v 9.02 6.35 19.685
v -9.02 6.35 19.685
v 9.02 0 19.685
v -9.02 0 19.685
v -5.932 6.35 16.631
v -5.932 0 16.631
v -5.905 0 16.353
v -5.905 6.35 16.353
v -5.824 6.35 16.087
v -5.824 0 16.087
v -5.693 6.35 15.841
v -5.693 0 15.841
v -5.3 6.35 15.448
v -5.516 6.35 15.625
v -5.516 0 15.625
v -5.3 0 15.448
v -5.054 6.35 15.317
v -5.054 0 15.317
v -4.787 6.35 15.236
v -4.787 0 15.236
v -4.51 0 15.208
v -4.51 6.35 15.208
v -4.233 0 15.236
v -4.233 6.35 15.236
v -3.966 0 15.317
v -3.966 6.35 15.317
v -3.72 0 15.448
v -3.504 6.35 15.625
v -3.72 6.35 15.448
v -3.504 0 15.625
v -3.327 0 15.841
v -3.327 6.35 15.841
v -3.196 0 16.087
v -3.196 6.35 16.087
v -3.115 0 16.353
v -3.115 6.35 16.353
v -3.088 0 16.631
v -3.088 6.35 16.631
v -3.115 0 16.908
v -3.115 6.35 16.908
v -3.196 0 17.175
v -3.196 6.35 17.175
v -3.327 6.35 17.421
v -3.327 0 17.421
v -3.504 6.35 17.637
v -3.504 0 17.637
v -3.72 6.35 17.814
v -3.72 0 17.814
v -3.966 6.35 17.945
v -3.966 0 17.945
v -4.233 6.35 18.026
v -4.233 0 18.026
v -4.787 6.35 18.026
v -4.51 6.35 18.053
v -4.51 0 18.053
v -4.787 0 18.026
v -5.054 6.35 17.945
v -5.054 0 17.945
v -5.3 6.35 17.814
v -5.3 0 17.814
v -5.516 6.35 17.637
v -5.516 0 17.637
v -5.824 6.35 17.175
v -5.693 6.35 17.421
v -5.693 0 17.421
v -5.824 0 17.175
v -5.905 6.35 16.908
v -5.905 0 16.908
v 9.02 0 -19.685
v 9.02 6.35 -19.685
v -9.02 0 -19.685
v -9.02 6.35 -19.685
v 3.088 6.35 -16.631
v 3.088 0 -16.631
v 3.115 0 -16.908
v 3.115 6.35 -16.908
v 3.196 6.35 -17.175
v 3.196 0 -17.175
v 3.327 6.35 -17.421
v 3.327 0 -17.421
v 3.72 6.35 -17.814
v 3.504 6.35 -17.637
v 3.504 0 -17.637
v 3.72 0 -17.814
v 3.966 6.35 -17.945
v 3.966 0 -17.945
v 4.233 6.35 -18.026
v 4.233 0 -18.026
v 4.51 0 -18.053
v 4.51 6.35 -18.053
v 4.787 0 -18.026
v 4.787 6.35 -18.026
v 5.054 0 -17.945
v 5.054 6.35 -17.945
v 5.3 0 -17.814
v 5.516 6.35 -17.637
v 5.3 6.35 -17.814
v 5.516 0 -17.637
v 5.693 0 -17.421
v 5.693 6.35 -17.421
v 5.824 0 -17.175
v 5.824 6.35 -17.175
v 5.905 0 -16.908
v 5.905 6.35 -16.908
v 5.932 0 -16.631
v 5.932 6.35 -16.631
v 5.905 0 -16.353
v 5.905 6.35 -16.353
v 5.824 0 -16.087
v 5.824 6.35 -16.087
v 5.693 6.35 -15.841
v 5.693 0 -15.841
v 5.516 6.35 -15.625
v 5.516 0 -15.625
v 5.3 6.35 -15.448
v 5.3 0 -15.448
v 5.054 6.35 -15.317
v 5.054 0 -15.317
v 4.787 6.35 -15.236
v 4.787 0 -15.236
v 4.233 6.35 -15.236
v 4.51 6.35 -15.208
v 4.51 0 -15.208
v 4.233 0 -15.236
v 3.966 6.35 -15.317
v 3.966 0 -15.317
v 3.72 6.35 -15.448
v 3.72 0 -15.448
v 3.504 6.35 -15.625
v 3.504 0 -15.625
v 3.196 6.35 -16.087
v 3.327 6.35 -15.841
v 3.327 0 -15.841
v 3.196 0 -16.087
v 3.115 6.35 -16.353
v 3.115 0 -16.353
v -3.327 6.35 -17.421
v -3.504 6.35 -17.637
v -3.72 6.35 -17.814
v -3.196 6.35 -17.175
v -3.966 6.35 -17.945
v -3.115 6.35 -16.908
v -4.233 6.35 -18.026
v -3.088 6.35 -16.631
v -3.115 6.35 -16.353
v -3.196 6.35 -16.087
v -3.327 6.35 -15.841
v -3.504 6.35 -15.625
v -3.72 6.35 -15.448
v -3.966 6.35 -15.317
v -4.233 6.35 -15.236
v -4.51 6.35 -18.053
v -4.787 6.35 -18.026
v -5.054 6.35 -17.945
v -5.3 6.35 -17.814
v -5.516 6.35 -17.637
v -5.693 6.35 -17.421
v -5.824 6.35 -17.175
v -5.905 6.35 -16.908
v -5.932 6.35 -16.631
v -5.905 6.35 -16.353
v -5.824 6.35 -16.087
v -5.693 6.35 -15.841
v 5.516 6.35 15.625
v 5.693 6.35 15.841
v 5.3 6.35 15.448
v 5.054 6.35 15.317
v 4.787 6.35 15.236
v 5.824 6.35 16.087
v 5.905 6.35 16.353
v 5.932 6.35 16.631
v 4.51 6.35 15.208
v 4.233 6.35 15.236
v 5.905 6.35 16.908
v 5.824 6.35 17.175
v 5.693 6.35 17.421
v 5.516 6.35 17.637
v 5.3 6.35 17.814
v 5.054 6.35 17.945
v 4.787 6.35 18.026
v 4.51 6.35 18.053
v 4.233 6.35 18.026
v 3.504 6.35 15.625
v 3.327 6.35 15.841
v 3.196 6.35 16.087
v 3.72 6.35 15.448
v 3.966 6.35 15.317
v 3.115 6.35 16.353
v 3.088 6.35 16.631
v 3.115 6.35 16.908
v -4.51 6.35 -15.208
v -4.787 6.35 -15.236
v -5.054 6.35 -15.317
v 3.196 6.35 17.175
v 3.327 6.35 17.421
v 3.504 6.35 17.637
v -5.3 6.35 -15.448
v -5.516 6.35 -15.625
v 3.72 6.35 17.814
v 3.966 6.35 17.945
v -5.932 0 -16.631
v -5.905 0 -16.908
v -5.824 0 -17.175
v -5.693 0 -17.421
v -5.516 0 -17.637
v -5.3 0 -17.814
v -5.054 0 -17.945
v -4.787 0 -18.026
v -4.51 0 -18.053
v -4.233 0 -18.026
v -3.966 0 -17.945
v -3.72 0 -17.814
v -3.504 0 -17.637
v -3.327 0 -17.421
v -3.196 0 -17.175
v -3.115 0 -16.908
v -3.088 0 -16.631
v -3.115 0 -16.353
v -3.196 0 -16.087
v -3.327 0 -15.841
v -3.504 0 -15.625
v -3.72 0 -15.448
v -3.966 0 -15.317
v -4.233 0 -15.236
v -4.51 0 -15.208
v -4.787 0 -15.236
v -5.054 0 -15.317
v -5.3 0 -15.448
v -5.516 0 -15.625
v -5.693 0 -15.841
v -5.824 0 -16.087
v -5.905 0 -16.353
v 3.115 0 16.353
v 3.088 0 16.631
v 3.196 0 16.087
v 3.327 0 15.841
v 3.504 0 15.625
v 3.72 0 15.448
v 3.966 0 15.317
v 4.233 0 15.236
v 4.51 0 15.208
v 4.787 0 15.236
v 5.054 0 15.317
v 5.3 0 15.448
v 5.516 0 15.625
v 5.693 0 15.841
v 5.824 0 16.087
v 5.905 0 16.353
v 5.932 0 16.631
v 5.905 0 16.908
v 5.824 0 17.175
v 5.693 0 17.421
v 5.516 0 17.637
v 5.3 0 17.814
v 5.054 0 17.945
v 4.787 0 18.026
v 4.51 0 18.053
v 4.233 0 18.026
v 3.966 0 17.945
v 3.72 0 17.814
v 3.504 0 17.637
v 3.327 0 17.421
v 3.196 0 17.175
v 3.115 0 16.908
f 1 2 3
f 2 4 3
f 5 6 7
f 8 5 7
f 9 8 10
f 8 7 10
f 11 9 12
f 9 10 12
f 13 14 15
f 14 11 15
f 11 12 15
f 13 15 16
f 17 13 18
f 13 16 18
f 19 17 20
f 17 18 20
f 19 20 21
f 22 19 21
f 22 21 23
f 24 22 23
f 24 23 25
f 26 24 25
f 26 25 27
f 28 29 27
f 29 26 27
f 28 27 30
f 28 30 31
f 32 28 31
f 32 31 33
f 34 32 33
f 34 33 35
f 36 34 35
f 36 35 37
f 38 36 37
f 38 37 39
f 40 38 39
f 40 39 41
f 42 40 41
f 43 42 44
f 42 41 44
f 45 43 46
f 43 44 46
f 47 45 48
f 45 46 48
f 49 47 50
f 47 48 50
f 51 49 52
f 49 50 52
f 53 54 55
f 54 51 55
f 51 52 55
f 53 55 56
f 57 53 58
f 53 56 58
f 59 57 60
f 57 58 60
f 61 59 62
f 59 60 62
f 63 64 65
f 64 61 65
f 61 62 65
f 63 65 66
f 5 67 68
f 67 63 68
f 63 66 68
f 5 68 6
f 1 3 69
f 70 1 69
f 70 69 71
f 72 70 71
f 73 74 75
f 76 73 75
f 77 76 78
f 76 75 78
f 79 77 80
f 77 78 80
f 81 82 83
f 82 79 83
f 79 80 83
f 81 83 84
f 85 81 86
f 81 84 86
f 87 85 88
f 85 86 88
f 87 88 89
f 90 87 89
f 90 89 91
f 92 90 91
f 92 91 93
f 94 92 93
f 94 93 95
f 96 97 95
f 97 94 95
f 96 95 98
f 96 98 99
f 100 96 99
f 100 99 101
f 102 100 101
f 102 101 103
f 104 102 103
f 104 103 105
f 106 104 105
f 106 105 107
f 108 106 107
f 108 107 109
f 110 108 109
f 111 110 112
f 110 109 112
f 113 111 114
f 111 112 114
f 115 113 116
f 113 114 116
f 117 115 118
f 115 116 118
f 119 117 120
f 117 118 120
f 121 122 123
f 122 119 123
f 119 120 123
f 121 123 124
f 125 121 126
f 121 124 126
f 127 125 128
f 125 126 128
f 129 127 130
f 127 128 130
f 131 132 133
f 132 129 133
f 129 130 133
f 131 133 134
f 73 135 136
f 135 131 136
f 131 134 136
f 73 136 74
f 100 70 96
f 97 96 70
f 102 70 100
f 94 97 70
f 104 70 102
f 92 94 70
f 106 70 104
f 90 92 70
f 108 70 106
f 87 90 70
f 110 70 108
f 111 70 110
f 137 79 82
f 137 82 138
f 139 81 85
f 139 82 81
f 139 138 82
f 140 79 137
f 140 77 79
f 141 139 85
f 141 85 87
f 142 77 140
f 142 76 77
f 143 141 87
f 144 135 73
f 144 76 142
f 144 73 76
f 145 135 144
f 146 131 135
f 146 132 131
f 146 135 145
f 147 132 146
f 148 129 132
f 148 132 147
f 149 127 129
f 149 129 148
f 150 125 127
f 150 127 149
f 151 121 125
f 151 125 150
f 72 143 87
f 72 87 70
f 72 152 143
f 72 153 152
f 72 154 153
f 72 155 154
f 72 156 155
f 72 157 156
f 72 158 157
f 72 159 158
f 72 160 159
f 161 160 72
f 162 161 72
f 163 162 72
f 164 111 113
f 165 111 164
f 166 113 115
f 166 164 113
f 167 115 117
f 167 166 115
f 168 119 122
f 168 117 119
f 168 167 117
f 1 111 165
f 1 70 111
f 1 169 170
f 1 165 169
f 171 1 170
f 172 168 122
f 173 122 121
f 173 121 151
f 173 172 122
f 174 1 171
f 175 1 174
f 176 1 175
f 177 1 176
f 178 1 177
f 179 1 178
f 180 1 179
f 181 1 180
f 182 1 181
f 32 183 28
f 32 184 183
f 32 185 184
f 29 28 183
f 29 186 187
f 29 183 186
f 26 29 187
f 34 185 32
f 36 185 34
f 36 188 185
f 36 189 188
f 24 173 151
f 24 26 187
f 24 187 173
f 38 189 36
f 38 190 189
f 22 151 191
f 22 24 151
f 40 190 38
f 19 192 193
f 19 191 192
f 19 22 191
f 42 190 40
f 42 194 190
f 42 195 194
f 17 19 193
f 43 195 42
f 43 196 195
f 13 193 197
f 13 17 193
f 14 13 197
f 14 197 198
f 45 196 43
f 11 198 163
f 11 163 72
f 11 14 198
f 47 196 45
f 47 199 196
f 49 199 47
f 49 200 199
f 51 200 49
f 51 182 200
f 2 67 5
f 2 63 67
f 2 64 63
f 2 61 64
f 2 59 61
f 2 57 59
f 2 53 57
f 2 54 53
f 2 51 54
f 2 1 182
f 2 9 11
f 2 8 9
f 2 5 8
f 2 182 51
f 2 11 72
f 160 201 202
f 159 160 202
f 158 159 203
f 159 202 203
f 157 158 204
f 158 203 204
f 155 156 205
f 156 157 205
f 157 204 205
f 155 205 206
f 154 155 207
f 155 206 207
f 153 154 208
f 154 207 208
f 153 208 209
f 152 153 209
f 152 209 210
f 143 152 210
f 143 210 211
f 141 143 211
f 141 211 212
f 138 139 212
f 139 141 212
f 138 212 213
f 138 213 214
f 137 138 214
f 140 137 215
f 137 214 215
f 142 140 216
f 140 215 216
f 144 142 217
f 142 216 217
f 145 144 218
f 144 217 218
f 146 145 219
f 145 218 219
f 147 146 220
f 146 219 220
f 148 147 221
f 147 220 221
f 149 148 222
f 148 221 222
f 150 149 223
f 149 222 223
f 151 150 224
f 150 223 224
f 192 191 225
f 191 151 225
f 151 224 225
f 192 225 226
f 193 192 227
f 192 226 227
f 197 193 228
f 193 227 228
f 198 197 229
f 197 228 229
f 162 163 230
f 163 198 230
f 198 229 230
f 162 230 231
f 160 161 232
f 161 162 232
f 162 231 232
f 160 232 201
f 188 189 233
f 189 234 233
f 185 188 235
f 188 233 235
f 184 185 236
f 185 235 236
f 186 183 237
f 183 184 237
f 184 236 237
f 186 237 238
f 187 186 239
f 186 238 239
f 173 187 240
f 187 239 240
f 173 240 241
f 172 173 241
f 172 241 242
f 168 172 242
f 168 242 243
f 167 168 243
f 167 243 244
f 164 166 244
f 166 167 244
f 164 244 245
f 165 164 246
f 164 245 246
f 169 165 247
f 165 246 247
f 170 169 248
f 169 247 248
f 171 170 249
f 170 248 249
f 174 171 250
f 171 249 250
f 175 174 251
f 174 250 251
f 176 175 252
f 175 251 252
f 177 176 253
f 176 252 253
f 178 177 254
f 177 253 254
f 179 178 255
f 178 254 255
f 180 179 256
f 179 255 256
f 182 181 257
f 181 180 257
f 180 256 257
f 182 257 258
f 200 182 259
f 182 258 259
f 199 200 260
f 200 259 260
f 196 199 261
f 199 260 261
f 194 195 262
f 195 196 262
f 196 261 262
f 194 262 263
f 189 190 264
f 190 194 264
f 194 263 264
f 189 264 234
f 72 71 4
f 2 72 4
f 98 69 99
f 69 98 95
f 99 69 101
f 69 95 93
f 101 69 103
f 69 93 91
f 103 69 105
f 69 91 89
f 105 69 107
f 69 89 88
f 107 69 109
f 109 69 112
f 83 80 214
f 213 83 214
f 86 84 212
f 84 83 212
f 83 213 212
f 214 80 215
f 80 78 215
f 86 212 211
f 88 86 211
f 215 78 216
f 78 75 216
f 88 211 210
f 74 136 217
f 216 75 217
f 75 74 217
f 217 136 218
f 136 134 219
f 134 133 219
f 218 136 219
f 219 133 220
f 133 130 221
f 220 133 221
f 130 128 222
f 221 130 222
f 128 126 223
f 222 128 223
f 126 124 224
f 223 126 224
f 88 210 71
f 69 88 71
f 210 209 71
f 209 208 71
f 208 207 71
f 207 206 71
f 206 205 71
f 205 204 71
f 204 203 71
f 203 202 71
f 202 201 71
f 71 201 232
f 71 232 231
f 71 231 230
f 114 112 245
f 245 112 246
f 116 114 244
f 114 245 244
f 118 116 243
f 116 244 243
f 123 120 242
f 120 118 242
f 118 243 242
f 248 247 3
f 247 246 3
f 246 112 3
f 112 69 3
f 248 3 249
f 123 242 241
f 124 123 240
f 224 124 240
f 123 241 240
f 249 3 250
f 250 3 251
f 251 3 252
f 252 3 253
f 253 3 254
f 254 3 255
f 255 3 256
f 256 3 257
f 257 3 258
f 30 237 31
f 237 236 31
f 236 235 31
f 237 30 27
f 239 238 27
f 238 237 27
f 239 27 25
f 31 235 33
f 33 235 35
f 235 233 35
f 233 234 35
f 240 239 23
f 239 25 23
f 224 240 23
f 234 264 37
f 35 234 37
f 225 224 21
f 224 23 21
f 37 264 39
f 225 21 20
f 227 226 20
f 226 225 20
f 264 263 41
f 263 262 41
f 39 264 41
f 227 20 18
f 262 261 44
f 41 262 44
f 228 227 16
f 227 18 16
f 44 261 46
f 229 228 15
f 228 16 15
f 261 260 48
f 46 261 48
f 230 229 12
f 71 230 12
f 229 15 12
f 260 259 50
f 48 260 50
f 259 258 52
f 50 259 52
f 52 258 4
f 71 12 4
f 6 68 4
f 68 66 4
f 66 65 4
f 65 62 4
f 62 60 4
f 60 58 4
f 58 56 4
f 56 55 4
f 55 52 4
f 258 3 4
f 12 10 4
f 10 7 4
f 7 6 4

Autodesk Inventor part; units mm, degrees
ref_plane "YZ Plane" through (0, 0, 0) normal (1, 0, 0) x (0, 1, 0)
ref_plane "XZ Plane" through (0, 0, 0) normal (0, 1, 0) x (-1, 0, 0)
ref_plane "XY Plane" through (0, 0, 0) normal (0, 0, 1) x (1, 0, 0)
sketch "Sketch1" plane through (0, 0, 0) normal (0, 1, 0) x (-1, 0, 0)
  line L0 (9.02, 19.685) -> (-9.02, 19.685)
  line L1 (-9.02, 19.685) -> (-9.02, -19.685)
  line L2 (-9.02, -19.685) -> (9.02, -19.685)
  line L3 (9.02, -19.685) -> (9.02, 19.685)
  circle A0 centre (4.51, 16.6309) radius 1.4224
  circle A1 centre (-4.51, 16.6309) radius 1.4224
  circle A2 centre (4.51, -16.6309) radius 1.4224
  circle A3 centre (-4.51, -16.6309) radius 1.4224
  point P0 (0, 0)
  dimension "d0" = 39.37
  dimension "d1" = 19.685
  dimension "d2" = 18.04
  dimension "d3" = 9.02
  dimension "d4" = 4.51
  dimension "d5" = 3.0541
  dimension "d6" = 2.8448
  dimension "d7" = 3.0541
  dimension "d8" = 3.0541
  dimension "d9" = 3.0541
  dimension "d10" = 2.8448
  dimension "d11" = 2.8448
  dimension "d12" = 2.8448
  dimension "d13" = 4.51
  dimension "d14" = 4.51
  dimension "d15" = 4.51
extrude "Extrusion1" add sketch "Sketch1" along normal blind 6.35
equation "\"d1\" = 0.5 * d0"
equation "\"d3\" = 0.5 * d2"
equation "\"d7\" = d5"
equation "\"d8\" = d5"
equation "\"d9\" = d5"
equation "\"d10\" = d6"
equation "\"d11\" = d10"
equation "\"d12\" = d6"
equation "\"d13\" = d4"
equation "\"d14\" = d4"
equation "\"d15\" = d4"
properties part number "MotorMountSpacer" material "Aluminum 6061"
